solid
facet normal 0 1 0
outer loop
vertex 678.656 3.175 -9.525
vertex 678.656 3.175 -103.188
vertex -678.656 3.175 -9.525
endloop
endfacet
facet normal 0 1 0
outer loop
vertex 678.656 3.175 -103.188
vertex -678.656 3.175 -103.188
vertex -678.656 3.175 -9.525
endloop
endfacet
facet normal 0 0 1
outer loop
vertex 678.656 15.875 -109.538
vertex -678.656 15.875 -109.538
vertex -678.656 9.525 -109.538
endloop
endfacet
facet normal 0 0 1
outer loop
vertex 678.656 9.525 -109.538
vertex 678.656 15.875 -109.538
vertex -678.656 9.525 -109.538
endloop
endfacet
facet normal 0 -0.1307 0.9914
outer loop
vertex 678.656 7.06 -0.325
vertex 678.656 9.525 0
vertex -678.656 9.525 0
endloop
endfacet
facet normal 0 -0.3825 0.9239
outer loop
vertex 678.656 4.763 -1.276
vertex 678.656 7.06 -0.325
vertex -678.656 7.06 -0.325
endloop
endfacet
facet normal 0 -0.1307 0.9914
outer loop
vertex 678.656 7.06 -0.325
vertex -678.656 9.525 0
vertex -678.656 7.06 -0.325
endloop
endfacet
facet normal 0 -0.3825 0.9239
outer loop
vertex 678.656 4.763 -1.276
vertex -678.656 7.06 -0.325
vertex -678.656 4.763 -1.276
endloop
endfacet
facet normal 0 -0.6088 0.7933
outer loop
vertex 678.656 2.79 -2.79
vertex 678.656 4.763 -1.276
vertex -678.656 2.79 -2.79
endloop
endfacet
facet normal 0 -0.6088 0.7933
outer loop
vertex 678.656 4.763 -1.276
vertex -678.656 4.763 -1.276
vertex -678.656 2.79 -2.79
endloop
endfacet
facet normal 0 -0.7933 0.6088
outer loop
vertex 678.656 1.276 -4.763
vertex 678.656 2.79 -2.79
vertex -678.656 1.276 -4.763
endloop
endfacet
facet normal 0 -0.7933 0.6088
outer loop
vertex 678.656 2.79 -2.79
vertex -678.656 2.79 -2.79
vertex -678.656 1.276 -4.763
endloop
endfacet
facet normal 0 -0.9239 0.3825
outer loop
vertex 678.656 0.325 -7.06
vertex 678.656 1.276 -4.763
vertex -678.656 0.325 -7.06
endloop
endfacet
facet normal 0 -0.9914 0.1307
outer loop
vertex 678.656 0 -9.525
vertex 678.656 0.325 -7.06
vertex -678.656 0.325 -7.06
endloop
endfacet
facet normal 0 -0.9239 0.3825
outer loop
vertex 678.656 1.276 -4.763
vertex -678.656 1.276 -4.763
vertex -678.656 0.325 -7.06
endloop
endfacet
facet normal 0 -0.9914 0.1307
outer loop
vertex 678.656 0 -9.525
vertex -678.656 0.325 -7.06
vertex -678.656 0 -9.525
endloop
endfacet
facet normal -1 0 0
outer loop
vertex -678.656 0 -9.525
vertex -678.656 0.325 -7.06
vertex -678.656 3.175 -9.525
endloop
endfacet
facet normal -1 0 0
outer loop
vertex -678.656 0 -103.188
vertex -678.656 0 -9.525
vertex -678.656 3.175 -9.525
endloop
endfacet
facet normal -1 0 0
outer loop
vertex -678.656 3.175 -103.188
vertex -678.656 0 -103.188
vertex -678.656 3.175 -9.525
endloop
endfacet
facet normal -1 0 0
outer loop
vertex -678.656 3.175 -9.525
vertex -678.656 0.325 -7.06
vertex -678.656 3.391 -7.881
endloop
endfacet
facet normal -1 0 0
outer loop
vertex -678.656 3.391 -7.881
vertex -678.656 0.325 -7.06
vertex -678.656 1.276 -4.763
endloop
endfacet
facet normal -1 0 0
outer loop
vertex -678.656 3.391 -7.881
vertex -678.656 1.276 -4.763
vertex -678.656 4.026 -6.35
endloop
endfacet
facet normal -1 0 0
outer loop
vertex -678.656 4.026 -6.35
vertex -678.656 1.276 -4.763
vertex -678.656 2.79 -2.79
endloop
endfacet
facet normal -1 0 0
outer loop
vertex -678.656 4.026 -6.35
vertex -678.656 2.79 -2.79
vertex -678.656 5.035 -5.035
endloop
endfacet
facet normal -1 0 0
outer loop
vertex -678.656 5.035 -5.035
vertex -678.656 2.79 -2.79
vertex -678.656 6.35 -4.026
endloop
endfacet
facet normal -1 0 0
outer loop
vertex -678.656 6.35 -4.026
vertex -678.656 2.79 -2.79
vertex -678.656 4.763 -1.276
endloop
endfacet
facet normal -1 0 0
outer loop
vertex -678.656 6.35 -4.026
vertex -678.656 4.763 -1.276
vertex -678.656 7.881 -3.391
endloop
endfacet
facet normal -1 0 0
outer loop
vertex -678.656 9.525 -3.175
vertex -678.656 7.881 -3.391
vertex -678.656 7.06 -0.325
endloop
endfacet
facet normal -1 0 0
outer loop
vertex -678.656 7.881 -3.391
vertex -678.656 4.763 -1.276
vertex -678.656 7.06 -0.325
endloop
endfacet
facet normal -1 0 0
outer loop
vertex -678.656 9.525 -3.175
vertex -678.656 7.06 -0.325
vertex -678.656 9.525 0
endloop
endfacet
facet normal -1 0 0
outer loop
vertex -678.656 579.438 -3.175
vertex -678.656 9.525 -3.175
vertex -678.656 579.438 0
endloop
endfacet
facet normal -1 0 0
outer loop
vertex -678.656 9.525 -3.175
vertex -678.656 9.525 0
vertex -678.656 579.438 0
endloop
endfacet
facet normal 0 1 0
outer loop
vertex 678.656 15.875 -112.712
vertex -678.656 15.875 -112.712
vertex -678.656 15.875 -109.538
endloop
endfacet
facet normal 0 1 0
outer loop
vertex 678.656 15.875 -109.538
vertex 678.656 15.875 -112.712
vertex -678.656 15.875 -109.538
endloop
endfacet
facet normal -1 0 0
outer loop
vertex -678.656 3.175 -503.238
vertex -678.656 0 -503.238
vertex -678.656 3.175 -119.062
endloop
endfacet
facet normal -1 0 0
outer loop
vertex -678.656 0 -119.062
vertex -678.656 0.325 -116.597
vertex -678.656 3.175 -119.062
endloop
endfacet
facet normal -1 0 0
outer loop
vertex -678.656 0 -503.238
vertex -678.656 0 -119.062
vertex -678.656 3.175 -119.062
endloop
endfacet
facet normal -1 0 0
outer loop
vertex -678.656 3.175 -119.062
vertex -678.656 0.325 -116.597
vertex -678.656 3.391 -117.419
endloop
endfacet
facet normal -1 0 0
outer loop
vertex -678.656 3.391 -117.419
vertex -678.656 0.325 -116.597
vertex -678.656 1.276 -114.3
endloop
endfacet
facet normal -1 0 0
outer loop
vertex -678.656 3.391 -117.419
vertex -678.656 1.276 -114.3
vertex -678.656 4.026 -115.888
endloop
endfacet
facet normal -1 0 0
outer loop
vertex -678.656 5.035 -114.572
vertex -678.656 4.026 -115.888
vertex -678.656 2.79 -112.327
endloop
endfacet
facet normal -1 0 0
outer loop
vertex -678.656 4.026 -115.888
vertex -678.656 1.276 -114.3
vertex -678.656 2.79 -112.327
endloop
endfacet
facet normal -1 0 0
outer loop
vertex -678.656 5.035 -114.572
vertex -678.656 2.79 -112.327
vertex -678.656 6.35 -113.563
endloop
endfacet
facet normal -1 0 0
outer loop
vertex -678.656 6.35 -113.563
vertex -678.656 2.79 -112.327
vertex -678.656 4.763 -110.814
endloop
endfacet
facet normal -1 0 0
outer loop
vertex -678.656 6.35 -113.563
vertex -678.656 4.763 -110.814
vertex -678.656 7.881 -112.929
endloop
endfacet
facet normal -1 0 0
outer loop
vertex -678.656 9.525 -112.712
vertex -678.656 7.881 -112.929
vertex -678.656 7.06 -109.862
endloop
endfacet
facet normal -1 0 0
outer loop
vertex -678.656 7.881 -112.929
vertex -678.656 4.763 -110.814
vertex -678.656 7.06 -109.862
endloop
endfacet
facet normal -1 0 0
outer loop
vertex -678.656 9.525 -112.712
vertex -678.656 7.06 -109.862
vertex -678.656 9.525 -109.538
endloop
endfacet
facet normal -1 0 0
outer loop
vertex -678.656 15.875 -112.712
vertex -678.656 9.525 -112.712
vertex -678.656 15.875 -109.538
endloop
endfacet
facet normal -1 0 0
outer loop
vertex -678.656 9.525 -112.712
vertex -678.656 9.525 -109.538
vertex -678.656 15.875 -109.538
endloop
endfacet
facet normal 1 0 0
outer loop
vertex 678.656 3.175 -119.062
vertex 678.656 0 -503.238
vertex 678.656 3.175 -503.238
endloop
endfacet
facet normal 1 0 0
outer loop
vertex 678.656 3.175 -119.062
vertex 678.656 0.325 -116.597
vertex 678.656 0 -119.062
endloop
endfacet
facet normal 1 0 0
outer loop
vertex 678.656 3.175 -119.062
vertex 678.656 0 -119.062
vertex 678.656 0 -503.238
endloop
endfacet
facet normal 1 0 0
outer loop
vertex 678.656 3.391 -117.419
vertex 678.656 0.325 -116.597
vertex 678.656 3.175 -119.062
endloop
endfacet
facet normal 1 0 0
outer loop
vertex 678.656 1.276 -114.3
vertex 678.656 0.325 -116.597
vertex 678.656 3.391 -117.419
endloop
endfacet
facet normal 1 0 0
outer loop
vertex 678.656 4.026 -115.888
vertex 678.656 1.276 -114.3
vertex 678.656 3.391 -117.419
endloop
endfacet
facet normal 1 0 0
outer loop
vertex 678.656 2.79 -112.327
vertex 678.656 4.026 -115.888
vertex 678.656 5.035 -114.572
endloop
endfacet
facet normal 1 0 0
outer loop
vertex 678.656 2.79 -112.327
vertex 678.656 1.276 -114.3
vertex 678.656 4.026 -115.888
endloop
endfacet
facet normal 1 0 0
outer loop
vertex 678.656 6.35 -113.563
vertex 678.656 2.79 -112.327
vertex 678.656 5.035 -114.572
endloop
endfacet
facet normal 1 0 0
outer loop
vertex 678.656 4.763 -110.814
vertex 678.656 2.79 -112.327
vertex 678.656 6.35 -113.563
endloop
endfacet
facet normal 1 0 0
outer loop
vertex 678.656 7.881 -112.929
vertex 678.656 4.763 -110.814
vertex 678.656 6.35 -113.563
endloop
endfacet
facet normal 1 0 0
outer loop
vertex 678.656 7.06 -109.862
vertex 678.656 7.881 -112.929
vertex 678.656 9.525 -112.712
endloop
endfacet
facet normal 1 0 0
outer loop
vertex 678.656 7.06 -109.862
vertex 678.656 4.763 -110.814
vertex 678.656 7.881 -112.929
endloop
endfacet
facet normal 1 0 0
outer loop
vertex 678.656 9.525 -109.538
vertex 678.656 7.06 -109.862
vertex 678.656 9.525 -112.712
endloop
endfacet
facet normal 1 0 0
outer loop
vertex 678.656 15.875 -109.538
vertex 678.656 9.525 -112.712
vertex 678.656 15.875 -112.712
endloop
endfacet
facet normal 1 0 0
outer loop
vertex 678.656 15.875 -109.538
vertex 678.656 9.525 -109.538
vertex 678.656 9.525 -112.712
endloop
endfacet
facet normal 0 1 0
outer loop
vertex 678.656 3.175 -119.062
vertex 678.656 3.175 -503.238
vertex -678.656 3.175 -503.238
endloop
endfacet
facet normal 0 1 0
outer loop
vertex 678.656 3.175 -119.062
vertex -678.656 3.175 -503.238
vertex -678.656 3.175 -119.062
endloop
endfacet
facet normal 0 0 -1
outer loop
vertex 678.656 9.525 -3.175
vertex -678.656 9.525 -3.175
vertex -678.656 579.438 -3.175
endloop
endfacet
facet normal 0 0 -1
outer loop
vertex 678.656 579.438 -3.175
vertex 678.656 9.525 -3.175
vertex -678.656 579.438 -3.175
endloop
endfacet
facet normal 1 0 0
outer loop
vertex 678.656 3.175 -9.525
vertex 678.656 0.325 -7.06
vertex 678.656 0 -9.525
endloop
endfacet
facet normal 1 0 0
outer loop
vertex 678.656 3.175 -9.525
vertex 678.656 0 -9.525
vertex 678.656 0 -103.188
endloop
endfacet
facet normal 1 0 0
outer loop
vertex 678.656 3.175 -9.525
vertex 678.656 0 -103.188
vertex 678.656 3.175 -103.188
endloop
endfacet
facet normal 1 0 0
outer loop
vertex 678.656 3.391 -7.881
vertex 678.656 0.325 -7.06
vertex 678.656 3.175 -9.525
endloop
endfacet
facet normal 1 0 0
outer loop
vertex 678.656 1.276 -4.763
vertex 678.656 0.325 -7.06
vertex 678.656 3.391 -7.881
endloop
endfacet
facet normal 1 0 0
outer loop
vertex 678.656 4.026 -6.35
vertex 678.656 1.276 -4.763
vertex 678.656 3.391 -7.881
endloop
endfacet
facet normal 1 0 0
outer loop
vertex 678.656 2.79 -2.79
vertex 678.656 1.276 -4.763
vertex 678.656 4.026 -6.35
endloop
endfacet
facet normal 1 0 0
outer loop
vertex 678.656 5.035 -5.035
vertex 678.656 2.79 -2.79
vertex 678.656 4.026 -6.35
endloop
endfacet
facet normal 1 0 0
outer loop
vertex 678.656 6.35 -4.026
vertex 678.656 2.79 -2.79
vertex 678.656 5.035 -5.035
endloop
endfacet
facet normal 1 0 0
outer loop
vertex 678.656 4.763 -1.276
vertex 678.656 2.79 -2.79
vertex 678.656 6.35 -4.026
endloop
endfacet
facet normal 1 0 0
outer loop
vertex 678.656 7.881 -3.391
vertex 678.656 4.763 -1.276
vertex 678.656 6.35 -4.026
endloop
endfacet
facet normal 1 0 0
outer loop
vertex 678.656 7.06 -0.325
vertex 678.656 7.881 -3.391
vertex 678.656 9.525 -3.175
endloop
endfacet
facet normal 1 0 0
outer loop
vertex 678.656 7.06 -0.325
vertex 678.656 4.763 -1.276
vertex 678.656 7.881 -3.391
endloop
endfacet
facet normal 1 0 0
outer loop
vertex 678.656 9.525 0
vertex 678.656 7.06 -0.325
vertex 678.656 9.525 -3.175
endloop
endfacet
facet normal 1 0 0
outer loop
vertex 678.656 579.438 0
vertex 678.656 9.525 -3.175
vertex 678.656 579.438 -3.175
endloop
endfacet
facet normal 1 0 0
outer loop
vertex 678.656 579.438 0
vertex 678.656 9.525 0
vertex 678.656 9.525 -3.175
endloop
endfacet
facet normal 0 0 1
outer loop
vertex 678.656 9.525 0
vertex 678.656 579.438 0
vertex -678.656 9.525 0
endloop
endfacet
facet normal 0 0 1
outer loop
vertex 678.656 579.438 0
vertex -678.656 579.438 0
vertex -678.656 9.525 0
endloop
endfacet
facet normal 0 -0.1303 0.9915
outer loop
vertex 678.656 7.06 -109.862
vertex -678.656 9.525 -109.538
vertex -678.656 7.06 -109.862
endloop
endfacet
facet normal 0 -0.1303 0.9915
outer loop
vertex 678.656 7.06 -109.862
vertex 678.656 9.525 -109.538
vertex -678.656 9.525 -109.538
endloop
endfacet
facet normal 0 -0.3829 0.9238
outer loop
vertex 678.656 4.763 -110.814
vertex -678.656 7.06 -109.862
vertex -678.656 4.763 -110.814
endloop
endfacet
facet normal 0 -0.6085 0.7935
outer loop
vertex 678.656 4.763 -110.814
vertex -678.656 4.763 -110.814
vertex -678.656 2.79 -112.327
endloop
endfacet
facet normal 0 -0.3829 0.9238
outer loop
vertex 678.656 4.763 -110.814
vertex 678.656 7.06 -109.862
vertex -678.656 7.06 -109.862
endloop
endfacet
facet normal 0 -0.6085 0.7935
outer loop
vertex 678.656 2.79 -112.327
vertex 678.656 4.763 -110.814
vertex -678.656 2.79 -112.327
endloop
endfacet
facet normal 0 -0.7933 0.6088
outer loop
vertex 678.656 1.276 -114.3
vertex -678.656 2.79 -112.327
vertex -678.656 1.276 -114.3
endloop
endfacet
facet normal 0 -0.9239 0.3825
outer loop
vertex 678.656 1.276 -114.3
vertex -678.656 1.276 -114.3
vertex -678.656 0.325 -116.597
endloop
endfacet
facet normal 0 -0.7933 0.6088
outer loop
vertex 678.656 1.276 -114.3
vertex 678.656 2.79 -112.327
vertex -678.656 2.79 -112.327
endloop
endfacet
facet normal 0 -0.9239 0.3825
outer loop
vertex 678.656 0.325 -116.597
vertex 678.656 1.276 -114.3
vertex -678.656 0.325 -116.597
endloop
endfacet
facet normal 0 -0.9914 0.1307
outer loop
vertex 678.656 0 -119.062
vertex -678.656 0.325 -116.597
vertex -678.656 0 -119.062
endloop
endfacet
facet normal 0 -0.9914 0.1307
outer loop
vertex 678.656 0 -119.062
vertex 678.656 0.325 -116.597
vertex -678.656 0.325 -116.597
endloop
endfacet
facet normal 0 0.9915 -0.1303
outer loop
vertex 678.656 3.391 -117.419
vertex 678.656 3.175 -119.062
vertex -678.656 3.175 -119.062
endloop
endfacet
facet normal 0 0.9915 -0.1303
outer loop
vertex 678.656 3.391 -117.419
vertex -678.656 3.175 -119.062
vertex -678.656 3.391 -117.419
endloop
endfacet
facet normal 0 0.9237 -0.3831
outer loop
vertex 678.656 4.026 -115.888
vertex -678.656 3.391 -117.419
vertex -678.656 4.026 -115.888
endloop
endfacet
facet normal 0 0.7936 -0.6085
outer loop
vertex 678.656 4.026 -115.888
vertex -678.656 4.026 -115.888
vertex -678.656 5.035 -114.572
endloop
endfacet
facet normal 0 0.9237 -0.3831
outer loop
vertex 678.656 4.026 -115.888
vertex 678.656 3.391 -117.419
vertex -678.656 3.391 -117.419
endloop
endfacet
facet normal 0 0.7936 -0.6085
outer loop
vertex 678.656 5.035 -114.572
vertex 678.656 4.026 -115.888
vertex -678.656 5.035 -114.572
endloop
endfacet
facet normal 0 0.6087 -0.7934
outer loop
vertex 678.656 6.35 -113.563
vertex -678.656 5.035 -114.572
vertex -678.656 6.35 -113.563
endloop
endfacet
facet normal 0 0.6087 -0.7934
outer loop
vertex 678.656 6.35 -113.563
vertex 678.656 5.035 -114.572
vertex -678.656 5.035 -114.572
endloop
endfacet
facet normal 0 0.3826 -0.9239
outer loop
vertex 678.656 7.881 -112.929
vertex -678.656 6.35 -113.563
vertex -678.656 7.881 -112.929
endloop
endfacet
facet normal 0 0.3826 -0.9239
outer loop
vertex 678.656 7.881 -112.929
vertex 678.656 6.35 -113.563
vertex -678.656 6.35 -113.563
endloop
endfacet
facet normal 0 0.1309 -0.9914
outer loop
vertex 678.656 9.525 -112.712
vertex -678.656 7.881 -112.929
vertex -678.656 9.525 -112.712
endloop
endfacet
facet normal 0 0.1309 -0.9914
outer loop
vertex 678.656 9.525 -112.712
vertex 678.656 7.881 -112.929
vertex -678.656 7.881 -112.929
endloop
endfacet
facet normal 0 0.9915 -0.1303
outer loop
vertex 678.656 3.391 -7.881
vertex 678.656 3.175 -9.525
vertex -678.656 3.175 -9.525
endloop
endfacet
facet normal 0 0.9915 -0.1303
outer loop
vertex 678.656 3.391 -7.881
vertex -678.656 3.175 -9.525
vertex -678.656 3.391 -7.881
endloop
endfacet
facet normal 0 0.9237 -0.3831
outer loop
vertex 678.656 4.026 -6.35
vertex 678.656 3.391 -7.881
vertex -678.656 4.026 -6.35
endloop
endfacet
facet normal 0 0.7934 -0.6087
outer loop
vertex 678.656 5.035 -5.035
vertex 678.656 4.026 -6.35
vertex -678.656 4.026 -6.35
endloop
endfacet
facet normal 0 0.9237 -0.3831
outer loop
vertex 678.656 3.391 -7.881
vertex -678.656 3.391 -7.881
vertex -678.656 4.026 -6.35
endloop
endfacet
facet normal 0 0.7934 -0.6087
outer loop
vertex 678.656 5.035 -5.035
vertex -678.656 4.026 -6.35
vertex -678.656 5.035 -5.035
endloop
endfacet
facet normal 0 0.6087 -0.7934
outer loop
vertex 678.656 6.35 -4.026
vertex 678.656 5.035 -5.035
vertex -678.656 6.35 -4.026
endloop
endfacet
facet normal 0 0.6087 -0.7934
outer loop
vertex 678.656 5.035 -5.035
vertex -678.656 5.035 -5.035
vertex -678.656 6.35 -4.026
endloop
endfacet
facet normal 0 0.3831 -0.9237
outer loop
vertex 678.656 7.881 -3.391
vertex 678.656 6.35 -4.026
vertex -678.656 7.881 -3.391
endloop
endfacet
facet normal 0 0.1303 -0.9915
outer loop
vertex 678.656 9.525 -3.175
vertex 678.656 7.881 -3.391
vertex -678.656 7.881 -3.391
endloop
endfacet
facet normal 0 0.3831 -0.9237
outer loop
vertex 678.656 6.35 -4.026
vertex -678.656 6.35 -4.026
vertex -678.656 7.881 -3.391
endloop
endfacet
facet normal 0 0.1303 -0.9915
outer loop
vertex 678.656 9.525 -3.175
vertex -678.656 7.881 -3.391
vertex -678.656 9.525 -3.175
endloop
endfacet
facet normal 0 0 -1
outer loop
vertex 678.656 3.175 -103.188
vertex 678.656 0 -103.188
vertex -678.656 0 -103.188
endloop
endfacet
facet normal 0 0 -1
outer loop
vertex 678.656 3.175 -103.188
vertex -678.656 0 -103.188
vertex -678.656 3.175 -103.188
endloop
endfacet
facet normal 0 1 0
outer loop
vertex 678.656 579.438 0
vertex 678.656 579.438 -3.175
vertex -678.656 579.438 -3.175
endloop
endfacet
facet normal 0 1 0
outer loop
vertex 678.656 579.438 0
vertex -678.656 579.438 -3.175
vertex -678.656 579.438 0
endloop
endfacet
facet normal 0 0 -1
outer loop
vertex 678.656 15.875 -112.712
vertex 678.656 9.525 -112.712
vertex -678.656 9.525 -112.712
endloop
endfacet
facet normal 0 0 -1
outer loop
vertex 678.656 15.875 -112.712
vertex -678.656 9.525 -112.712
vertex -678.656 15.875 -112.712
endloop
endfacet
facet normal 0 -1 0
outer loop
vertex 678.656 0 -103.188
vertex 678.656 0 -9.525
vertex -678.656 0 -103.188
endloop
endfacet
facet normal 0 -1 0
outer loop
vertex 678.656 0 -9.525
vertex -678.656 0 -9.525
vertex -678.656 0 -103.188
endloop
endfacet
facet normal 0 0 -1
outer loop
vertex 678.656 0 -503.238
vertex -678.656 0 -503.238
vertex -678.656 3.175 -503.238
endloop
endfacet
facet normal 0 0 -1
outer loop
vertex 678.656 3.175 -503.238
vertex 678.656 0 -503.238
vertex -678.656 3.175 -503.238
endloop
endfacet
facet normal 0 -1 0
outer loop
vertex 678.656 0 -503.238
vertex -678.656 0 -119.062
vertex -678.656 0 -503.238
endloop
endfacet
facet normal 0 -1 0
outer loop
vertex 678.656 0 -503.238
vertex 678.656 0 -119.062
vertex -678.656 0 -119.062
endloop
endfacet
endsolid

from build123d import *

# Parameters (mm, degrees)
F1_DEPTH = 678.65625


with BuildPart() as f1:
    # F0 (on Right) → F1 (new body, symmetric)
    with BuildSketch(Plane.YZ):
        with BuildLine():
            Line((579.4375, -3.175), (579.4375, 0))
            Line((579.4375, 0), (9.525, 0))
            ThreePointArc((9.525, 0), (2.789808, -2.789808), (0, -9.525))
            Line((0, -9.525), (0, -103.1875))
            Line((0, -103.1875), (3.175, -103.1875))
            Line((3.175, -103.1875), (3.175, -9.525))
            ThreePointArc((3.175, -9.525), (5.034872, -5.034872), (9.525, -3.175))
            Line((9.525, -3.175), (579.4375, -3.175))
        make_face()
        with BuildLine():
            Line((0, -503.2375), (3.175, -503.2375))
            Line((3.175, -503.2375), (3.175, -119.0625))
            ThreePointArc((3.175, -119.0625), (5.034872, -114.572372), (9.525, -112.7125))
            Line((9.525, -112.7125), (15.875, -112.7125))
            Line((15.875, -112.7125), (15.875, -109.5375))
            Line((15.875, -109.5375), (9.525, -109.5375))
            ThreePointArc((9.525, -109.5375), (2.789808, -112.327308), (0, -119.0625))
            Line((0, -119.0625), (0, -503.2375))
        make_face()
    extrude(amount=F1_DEPTH, both=True)


solid = f1.part
